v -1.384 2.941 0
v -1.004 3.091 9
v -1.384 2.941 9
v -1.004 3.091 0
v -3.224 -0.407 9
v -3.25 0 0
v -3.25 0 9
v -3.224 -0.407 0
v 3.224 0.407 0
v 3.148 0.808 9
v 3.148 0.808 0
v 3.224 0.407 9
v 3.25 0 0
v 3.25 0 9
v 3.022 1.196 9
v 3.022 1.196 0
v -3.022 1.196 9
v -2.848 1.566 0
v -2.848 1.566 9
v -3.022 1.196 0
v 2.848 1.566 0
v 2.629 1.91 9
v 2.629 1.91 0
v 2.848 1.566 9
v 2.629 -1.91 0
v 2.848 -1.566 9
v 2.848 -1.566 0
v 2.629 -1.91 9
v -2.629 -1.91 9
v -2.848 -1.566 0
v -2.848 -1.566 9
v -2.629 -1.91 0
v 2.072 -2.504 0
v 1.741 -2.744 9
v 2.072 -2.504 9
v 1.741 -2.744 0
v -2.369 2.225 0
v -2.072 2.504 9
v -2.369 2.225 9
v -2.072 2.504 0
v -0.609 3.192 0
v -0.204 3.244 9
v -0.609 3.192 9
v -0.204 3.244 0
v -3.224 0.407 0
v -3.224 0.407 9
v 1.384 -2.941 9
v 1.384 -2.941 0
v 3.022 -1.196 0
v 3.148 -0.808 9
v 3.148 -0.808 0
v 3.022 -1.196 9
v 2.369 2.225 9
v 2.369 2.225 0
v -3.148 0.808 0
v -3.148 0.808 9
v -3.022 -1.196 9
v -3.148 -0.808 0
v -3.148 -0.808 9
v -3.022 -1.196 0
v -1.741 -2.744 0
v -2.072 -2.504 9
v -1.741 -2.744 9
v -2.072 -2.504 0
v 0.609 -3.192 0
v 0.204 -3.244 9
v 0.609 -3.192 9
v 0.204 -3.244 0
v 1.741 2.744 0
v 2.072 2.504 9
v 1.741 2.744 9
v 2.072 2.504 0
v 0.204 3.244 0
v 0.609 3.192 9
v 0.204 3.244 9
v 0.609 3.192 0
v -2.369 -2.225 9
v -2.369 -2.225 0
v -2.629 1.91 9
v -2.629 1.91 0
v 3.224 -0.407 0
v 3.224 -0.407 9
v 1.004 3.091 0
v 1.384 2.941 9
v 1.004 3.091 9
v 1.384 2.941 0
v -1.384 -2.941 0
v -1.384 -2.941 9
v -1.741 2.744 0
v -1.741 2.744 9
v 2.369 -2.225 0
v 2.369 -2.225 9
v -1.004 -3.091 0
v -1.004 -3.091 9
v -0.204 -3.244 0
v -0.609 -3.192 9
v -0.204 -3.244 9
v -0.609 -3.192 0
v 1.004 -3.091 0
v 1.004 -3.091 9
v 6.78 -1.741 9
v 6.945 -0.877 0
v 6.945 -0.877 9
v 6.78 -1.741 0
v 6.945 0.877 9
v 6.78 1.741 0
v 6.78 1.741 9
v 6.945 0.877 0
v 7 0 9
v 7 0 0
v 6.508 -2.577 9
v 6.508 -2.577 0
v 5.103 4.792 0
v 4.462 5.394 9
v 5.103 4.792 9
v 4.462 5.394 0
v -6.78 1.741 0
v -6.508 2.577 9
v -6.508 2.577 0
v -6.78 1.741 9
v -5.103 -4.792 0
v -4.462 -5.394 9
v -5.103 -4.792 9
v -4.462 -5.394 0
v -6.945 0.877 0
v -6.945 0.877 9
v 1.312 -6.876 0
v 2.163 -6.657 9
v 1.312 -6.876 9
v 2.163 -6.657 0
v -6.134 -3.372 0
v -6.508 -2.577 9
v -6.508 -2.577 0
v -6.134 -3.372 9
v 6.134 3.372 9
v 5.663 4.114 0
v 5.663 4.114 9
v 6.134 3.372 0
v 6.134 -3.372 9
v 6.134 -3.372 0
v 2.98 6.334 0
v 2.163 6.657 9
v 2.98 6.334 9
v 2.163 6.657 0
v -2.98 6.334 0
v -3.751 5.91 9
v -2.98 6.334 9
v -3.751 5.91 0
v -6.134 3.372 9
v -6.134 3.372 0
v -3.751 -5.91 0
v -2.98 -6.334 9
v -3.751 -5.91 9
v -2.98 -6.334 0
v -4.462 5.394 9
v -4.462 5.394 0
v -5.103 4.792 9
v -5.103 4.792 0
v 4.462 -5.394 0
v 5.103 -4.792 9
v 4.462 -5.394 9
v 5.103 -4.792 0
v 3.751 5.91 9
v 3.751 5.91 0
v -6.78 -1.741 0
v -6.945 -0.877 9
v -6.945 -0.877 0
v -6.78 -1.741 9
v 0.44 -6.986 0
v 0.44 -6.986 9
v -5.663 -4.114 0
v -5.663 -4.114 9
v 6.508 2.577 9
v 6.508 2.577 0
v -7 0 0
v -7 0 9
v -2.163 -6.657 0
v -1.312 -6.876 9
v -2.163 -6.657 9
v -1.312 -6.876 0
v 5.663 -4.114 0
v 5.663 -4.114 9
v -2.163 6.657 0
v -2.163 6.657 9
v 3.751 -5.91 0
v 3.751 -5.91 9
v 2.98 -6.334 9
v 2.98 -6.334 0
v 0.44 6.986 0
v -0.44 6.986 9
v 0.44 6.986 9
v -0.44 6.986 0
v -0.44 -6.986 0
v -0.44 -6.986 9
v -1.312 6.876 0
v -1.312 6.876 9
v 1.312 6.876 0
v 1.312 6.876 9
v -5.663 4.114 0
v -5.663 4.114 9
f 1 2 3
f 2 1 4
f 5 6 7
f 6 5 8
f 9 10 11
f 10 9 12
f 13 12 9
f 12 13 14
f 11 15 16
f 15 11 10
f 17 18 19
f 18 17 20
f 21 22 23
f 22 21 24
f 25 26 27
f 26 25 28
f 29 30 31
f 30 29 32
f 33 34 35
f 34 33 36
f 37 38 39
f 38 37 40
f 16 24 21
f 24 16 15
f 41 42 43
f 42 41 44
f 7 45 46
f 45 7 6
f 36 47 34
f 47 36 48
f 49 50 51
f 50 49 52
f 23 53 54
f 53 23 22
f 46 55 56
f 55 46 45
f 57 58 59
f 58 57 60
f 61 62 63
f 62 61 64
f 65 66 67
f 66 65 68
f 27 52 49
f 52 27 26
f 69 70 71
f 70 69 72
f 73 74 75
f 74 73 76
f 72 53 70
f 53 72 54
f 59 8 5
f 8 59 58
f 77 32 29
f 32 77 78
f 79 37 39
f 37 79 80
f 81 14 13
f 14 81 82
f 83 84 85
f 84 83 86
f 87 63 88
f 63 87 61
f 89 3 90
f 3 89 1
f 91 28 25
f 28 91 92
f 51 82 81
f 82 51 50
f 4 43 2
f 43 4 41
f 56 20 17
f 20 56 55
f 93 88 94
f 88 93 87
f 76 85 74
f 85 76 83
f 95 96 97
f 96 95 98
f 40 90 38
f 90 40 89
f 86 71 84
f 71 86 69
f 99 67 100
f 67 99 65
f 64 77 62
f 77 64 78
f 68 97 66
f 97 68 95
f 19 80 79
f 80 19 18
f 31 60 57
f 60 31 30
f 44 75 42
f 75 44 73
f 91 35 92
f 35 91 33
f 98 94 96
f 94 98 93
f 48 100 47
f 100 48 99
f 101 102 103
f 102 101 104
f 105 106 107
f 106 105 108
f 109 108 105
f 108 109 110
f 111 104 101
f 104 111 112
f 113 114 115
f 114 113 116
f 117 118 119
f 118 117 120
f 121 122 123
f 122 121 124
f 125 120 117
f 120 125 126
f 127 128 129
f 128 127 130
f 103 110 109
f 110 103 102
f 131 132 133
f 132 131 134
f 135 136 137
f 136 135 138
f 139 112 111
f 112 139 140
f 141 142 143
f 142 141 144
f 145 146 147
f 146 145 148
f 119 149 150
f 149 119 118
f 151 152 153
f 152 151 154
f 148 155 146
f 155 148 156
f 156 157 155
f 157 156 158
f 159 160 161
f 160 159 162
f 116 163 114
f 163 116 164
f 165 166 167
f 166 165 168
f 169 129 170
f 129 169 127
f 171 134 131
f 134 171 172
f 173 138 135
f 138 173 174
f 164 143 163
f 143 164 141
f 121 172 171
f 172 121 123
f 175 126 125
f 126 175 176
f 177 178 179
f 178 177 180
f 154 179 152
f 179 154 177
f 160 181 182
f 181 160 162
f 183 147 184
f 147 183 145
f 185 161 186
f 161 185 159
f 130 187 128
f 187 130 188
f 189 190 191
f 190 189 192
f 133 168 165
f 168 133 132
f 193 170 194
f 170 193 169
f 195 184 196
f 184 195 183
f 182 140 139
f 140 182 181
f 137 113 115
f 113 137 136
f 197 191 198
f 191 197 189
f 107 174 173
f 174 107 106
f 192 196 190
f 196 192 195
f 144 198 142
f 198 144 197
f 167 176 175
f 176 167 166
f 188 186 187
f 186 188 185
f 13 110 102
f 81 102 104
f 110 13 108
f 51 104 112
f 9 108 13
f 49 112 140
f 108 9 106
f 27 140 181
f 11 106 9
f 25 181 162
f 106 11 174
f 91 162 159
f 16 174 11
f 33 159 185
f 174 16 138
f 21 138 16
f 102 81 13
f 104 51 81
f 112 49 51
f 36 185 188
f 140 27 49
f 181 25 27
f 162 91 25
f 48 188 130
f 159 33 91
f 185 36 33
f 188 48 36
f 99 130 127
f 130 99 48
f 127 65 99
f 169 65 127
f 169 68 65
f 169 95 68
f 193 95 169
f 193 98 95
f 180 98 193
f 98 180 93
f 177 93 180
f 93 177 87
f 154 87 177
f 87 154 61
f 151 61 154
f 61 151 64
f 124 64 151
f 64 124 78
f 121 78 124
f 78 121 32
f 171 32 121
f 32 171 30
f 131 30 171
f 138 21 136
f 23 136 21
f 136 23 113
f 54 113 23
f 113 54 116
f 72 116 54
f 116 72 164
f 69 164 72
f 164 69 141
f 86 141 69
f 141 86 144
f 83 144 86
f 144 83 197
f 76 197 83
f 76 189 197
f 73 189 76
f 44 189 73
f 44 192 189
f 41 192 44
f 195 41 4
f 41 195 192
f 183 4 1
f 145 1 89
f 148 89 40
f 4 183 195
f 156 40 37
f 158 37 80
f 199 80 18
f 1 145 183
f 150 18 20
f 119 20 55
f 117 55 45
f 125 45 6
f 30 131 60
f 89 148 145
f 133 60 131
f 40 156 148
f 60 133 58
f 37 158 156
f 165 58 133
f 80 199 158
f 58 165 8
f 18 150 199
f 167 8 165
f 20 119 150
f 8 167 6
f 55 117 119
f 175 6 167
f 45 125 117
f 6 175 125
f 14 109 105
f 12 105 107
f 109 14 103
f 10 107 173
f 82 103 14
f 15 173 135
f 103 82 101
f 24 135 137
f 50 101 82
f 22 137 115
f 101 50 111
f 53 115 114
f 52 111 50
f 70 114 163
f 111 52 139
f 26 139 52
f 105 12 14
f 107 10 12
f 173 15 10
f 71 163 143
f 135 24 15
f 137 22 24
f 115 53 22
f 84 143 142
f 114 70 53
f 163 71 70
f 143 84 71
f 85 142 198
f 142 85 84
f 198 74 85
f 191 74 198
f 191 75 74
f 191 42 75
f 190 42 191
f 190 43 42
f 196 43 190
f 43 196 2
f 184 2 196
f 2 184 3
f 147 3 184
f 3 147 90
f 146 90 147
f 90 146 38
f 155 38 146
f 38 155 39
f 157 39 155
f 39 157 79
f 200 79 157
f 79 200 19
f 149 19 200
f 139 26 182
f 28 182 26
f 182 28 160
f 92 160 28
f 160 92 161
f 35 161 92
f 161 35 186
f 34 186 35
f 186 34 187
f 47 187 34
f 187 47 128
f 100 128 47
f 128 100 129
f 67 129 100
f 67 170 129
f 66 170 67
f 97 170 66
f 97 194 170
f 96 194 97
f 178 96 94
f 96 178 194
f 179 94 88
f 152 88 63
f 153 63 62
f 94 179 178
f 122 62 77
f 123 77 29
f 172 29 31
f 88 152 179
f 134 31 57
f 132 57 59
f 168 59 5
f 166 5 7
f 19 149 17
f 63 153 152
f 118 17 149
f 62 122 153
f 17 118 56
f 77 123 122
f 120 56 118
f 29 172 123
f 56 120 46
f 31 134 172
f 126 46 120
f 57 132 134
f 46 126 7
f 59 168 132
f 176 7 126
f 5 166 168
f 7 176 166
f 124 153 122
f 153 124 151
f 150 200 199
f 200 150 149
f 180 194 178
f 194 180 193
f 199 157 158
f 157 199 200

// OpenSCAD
$fn = 50;

difference() {
	union() {
		cylinder(h = 9, r = 7.0);
	}
	union() {
		translate(v = [0.0, 0.0, -100.0]) {
			cylinder(h = 200, r = 3.25);
		}
		translate(v = [0.0, 0.0, -100.0]) {
			cylinder(h = 200, r = 1.8);
		}
		cylinder(h = 9, r = 2.0);
	}
}
